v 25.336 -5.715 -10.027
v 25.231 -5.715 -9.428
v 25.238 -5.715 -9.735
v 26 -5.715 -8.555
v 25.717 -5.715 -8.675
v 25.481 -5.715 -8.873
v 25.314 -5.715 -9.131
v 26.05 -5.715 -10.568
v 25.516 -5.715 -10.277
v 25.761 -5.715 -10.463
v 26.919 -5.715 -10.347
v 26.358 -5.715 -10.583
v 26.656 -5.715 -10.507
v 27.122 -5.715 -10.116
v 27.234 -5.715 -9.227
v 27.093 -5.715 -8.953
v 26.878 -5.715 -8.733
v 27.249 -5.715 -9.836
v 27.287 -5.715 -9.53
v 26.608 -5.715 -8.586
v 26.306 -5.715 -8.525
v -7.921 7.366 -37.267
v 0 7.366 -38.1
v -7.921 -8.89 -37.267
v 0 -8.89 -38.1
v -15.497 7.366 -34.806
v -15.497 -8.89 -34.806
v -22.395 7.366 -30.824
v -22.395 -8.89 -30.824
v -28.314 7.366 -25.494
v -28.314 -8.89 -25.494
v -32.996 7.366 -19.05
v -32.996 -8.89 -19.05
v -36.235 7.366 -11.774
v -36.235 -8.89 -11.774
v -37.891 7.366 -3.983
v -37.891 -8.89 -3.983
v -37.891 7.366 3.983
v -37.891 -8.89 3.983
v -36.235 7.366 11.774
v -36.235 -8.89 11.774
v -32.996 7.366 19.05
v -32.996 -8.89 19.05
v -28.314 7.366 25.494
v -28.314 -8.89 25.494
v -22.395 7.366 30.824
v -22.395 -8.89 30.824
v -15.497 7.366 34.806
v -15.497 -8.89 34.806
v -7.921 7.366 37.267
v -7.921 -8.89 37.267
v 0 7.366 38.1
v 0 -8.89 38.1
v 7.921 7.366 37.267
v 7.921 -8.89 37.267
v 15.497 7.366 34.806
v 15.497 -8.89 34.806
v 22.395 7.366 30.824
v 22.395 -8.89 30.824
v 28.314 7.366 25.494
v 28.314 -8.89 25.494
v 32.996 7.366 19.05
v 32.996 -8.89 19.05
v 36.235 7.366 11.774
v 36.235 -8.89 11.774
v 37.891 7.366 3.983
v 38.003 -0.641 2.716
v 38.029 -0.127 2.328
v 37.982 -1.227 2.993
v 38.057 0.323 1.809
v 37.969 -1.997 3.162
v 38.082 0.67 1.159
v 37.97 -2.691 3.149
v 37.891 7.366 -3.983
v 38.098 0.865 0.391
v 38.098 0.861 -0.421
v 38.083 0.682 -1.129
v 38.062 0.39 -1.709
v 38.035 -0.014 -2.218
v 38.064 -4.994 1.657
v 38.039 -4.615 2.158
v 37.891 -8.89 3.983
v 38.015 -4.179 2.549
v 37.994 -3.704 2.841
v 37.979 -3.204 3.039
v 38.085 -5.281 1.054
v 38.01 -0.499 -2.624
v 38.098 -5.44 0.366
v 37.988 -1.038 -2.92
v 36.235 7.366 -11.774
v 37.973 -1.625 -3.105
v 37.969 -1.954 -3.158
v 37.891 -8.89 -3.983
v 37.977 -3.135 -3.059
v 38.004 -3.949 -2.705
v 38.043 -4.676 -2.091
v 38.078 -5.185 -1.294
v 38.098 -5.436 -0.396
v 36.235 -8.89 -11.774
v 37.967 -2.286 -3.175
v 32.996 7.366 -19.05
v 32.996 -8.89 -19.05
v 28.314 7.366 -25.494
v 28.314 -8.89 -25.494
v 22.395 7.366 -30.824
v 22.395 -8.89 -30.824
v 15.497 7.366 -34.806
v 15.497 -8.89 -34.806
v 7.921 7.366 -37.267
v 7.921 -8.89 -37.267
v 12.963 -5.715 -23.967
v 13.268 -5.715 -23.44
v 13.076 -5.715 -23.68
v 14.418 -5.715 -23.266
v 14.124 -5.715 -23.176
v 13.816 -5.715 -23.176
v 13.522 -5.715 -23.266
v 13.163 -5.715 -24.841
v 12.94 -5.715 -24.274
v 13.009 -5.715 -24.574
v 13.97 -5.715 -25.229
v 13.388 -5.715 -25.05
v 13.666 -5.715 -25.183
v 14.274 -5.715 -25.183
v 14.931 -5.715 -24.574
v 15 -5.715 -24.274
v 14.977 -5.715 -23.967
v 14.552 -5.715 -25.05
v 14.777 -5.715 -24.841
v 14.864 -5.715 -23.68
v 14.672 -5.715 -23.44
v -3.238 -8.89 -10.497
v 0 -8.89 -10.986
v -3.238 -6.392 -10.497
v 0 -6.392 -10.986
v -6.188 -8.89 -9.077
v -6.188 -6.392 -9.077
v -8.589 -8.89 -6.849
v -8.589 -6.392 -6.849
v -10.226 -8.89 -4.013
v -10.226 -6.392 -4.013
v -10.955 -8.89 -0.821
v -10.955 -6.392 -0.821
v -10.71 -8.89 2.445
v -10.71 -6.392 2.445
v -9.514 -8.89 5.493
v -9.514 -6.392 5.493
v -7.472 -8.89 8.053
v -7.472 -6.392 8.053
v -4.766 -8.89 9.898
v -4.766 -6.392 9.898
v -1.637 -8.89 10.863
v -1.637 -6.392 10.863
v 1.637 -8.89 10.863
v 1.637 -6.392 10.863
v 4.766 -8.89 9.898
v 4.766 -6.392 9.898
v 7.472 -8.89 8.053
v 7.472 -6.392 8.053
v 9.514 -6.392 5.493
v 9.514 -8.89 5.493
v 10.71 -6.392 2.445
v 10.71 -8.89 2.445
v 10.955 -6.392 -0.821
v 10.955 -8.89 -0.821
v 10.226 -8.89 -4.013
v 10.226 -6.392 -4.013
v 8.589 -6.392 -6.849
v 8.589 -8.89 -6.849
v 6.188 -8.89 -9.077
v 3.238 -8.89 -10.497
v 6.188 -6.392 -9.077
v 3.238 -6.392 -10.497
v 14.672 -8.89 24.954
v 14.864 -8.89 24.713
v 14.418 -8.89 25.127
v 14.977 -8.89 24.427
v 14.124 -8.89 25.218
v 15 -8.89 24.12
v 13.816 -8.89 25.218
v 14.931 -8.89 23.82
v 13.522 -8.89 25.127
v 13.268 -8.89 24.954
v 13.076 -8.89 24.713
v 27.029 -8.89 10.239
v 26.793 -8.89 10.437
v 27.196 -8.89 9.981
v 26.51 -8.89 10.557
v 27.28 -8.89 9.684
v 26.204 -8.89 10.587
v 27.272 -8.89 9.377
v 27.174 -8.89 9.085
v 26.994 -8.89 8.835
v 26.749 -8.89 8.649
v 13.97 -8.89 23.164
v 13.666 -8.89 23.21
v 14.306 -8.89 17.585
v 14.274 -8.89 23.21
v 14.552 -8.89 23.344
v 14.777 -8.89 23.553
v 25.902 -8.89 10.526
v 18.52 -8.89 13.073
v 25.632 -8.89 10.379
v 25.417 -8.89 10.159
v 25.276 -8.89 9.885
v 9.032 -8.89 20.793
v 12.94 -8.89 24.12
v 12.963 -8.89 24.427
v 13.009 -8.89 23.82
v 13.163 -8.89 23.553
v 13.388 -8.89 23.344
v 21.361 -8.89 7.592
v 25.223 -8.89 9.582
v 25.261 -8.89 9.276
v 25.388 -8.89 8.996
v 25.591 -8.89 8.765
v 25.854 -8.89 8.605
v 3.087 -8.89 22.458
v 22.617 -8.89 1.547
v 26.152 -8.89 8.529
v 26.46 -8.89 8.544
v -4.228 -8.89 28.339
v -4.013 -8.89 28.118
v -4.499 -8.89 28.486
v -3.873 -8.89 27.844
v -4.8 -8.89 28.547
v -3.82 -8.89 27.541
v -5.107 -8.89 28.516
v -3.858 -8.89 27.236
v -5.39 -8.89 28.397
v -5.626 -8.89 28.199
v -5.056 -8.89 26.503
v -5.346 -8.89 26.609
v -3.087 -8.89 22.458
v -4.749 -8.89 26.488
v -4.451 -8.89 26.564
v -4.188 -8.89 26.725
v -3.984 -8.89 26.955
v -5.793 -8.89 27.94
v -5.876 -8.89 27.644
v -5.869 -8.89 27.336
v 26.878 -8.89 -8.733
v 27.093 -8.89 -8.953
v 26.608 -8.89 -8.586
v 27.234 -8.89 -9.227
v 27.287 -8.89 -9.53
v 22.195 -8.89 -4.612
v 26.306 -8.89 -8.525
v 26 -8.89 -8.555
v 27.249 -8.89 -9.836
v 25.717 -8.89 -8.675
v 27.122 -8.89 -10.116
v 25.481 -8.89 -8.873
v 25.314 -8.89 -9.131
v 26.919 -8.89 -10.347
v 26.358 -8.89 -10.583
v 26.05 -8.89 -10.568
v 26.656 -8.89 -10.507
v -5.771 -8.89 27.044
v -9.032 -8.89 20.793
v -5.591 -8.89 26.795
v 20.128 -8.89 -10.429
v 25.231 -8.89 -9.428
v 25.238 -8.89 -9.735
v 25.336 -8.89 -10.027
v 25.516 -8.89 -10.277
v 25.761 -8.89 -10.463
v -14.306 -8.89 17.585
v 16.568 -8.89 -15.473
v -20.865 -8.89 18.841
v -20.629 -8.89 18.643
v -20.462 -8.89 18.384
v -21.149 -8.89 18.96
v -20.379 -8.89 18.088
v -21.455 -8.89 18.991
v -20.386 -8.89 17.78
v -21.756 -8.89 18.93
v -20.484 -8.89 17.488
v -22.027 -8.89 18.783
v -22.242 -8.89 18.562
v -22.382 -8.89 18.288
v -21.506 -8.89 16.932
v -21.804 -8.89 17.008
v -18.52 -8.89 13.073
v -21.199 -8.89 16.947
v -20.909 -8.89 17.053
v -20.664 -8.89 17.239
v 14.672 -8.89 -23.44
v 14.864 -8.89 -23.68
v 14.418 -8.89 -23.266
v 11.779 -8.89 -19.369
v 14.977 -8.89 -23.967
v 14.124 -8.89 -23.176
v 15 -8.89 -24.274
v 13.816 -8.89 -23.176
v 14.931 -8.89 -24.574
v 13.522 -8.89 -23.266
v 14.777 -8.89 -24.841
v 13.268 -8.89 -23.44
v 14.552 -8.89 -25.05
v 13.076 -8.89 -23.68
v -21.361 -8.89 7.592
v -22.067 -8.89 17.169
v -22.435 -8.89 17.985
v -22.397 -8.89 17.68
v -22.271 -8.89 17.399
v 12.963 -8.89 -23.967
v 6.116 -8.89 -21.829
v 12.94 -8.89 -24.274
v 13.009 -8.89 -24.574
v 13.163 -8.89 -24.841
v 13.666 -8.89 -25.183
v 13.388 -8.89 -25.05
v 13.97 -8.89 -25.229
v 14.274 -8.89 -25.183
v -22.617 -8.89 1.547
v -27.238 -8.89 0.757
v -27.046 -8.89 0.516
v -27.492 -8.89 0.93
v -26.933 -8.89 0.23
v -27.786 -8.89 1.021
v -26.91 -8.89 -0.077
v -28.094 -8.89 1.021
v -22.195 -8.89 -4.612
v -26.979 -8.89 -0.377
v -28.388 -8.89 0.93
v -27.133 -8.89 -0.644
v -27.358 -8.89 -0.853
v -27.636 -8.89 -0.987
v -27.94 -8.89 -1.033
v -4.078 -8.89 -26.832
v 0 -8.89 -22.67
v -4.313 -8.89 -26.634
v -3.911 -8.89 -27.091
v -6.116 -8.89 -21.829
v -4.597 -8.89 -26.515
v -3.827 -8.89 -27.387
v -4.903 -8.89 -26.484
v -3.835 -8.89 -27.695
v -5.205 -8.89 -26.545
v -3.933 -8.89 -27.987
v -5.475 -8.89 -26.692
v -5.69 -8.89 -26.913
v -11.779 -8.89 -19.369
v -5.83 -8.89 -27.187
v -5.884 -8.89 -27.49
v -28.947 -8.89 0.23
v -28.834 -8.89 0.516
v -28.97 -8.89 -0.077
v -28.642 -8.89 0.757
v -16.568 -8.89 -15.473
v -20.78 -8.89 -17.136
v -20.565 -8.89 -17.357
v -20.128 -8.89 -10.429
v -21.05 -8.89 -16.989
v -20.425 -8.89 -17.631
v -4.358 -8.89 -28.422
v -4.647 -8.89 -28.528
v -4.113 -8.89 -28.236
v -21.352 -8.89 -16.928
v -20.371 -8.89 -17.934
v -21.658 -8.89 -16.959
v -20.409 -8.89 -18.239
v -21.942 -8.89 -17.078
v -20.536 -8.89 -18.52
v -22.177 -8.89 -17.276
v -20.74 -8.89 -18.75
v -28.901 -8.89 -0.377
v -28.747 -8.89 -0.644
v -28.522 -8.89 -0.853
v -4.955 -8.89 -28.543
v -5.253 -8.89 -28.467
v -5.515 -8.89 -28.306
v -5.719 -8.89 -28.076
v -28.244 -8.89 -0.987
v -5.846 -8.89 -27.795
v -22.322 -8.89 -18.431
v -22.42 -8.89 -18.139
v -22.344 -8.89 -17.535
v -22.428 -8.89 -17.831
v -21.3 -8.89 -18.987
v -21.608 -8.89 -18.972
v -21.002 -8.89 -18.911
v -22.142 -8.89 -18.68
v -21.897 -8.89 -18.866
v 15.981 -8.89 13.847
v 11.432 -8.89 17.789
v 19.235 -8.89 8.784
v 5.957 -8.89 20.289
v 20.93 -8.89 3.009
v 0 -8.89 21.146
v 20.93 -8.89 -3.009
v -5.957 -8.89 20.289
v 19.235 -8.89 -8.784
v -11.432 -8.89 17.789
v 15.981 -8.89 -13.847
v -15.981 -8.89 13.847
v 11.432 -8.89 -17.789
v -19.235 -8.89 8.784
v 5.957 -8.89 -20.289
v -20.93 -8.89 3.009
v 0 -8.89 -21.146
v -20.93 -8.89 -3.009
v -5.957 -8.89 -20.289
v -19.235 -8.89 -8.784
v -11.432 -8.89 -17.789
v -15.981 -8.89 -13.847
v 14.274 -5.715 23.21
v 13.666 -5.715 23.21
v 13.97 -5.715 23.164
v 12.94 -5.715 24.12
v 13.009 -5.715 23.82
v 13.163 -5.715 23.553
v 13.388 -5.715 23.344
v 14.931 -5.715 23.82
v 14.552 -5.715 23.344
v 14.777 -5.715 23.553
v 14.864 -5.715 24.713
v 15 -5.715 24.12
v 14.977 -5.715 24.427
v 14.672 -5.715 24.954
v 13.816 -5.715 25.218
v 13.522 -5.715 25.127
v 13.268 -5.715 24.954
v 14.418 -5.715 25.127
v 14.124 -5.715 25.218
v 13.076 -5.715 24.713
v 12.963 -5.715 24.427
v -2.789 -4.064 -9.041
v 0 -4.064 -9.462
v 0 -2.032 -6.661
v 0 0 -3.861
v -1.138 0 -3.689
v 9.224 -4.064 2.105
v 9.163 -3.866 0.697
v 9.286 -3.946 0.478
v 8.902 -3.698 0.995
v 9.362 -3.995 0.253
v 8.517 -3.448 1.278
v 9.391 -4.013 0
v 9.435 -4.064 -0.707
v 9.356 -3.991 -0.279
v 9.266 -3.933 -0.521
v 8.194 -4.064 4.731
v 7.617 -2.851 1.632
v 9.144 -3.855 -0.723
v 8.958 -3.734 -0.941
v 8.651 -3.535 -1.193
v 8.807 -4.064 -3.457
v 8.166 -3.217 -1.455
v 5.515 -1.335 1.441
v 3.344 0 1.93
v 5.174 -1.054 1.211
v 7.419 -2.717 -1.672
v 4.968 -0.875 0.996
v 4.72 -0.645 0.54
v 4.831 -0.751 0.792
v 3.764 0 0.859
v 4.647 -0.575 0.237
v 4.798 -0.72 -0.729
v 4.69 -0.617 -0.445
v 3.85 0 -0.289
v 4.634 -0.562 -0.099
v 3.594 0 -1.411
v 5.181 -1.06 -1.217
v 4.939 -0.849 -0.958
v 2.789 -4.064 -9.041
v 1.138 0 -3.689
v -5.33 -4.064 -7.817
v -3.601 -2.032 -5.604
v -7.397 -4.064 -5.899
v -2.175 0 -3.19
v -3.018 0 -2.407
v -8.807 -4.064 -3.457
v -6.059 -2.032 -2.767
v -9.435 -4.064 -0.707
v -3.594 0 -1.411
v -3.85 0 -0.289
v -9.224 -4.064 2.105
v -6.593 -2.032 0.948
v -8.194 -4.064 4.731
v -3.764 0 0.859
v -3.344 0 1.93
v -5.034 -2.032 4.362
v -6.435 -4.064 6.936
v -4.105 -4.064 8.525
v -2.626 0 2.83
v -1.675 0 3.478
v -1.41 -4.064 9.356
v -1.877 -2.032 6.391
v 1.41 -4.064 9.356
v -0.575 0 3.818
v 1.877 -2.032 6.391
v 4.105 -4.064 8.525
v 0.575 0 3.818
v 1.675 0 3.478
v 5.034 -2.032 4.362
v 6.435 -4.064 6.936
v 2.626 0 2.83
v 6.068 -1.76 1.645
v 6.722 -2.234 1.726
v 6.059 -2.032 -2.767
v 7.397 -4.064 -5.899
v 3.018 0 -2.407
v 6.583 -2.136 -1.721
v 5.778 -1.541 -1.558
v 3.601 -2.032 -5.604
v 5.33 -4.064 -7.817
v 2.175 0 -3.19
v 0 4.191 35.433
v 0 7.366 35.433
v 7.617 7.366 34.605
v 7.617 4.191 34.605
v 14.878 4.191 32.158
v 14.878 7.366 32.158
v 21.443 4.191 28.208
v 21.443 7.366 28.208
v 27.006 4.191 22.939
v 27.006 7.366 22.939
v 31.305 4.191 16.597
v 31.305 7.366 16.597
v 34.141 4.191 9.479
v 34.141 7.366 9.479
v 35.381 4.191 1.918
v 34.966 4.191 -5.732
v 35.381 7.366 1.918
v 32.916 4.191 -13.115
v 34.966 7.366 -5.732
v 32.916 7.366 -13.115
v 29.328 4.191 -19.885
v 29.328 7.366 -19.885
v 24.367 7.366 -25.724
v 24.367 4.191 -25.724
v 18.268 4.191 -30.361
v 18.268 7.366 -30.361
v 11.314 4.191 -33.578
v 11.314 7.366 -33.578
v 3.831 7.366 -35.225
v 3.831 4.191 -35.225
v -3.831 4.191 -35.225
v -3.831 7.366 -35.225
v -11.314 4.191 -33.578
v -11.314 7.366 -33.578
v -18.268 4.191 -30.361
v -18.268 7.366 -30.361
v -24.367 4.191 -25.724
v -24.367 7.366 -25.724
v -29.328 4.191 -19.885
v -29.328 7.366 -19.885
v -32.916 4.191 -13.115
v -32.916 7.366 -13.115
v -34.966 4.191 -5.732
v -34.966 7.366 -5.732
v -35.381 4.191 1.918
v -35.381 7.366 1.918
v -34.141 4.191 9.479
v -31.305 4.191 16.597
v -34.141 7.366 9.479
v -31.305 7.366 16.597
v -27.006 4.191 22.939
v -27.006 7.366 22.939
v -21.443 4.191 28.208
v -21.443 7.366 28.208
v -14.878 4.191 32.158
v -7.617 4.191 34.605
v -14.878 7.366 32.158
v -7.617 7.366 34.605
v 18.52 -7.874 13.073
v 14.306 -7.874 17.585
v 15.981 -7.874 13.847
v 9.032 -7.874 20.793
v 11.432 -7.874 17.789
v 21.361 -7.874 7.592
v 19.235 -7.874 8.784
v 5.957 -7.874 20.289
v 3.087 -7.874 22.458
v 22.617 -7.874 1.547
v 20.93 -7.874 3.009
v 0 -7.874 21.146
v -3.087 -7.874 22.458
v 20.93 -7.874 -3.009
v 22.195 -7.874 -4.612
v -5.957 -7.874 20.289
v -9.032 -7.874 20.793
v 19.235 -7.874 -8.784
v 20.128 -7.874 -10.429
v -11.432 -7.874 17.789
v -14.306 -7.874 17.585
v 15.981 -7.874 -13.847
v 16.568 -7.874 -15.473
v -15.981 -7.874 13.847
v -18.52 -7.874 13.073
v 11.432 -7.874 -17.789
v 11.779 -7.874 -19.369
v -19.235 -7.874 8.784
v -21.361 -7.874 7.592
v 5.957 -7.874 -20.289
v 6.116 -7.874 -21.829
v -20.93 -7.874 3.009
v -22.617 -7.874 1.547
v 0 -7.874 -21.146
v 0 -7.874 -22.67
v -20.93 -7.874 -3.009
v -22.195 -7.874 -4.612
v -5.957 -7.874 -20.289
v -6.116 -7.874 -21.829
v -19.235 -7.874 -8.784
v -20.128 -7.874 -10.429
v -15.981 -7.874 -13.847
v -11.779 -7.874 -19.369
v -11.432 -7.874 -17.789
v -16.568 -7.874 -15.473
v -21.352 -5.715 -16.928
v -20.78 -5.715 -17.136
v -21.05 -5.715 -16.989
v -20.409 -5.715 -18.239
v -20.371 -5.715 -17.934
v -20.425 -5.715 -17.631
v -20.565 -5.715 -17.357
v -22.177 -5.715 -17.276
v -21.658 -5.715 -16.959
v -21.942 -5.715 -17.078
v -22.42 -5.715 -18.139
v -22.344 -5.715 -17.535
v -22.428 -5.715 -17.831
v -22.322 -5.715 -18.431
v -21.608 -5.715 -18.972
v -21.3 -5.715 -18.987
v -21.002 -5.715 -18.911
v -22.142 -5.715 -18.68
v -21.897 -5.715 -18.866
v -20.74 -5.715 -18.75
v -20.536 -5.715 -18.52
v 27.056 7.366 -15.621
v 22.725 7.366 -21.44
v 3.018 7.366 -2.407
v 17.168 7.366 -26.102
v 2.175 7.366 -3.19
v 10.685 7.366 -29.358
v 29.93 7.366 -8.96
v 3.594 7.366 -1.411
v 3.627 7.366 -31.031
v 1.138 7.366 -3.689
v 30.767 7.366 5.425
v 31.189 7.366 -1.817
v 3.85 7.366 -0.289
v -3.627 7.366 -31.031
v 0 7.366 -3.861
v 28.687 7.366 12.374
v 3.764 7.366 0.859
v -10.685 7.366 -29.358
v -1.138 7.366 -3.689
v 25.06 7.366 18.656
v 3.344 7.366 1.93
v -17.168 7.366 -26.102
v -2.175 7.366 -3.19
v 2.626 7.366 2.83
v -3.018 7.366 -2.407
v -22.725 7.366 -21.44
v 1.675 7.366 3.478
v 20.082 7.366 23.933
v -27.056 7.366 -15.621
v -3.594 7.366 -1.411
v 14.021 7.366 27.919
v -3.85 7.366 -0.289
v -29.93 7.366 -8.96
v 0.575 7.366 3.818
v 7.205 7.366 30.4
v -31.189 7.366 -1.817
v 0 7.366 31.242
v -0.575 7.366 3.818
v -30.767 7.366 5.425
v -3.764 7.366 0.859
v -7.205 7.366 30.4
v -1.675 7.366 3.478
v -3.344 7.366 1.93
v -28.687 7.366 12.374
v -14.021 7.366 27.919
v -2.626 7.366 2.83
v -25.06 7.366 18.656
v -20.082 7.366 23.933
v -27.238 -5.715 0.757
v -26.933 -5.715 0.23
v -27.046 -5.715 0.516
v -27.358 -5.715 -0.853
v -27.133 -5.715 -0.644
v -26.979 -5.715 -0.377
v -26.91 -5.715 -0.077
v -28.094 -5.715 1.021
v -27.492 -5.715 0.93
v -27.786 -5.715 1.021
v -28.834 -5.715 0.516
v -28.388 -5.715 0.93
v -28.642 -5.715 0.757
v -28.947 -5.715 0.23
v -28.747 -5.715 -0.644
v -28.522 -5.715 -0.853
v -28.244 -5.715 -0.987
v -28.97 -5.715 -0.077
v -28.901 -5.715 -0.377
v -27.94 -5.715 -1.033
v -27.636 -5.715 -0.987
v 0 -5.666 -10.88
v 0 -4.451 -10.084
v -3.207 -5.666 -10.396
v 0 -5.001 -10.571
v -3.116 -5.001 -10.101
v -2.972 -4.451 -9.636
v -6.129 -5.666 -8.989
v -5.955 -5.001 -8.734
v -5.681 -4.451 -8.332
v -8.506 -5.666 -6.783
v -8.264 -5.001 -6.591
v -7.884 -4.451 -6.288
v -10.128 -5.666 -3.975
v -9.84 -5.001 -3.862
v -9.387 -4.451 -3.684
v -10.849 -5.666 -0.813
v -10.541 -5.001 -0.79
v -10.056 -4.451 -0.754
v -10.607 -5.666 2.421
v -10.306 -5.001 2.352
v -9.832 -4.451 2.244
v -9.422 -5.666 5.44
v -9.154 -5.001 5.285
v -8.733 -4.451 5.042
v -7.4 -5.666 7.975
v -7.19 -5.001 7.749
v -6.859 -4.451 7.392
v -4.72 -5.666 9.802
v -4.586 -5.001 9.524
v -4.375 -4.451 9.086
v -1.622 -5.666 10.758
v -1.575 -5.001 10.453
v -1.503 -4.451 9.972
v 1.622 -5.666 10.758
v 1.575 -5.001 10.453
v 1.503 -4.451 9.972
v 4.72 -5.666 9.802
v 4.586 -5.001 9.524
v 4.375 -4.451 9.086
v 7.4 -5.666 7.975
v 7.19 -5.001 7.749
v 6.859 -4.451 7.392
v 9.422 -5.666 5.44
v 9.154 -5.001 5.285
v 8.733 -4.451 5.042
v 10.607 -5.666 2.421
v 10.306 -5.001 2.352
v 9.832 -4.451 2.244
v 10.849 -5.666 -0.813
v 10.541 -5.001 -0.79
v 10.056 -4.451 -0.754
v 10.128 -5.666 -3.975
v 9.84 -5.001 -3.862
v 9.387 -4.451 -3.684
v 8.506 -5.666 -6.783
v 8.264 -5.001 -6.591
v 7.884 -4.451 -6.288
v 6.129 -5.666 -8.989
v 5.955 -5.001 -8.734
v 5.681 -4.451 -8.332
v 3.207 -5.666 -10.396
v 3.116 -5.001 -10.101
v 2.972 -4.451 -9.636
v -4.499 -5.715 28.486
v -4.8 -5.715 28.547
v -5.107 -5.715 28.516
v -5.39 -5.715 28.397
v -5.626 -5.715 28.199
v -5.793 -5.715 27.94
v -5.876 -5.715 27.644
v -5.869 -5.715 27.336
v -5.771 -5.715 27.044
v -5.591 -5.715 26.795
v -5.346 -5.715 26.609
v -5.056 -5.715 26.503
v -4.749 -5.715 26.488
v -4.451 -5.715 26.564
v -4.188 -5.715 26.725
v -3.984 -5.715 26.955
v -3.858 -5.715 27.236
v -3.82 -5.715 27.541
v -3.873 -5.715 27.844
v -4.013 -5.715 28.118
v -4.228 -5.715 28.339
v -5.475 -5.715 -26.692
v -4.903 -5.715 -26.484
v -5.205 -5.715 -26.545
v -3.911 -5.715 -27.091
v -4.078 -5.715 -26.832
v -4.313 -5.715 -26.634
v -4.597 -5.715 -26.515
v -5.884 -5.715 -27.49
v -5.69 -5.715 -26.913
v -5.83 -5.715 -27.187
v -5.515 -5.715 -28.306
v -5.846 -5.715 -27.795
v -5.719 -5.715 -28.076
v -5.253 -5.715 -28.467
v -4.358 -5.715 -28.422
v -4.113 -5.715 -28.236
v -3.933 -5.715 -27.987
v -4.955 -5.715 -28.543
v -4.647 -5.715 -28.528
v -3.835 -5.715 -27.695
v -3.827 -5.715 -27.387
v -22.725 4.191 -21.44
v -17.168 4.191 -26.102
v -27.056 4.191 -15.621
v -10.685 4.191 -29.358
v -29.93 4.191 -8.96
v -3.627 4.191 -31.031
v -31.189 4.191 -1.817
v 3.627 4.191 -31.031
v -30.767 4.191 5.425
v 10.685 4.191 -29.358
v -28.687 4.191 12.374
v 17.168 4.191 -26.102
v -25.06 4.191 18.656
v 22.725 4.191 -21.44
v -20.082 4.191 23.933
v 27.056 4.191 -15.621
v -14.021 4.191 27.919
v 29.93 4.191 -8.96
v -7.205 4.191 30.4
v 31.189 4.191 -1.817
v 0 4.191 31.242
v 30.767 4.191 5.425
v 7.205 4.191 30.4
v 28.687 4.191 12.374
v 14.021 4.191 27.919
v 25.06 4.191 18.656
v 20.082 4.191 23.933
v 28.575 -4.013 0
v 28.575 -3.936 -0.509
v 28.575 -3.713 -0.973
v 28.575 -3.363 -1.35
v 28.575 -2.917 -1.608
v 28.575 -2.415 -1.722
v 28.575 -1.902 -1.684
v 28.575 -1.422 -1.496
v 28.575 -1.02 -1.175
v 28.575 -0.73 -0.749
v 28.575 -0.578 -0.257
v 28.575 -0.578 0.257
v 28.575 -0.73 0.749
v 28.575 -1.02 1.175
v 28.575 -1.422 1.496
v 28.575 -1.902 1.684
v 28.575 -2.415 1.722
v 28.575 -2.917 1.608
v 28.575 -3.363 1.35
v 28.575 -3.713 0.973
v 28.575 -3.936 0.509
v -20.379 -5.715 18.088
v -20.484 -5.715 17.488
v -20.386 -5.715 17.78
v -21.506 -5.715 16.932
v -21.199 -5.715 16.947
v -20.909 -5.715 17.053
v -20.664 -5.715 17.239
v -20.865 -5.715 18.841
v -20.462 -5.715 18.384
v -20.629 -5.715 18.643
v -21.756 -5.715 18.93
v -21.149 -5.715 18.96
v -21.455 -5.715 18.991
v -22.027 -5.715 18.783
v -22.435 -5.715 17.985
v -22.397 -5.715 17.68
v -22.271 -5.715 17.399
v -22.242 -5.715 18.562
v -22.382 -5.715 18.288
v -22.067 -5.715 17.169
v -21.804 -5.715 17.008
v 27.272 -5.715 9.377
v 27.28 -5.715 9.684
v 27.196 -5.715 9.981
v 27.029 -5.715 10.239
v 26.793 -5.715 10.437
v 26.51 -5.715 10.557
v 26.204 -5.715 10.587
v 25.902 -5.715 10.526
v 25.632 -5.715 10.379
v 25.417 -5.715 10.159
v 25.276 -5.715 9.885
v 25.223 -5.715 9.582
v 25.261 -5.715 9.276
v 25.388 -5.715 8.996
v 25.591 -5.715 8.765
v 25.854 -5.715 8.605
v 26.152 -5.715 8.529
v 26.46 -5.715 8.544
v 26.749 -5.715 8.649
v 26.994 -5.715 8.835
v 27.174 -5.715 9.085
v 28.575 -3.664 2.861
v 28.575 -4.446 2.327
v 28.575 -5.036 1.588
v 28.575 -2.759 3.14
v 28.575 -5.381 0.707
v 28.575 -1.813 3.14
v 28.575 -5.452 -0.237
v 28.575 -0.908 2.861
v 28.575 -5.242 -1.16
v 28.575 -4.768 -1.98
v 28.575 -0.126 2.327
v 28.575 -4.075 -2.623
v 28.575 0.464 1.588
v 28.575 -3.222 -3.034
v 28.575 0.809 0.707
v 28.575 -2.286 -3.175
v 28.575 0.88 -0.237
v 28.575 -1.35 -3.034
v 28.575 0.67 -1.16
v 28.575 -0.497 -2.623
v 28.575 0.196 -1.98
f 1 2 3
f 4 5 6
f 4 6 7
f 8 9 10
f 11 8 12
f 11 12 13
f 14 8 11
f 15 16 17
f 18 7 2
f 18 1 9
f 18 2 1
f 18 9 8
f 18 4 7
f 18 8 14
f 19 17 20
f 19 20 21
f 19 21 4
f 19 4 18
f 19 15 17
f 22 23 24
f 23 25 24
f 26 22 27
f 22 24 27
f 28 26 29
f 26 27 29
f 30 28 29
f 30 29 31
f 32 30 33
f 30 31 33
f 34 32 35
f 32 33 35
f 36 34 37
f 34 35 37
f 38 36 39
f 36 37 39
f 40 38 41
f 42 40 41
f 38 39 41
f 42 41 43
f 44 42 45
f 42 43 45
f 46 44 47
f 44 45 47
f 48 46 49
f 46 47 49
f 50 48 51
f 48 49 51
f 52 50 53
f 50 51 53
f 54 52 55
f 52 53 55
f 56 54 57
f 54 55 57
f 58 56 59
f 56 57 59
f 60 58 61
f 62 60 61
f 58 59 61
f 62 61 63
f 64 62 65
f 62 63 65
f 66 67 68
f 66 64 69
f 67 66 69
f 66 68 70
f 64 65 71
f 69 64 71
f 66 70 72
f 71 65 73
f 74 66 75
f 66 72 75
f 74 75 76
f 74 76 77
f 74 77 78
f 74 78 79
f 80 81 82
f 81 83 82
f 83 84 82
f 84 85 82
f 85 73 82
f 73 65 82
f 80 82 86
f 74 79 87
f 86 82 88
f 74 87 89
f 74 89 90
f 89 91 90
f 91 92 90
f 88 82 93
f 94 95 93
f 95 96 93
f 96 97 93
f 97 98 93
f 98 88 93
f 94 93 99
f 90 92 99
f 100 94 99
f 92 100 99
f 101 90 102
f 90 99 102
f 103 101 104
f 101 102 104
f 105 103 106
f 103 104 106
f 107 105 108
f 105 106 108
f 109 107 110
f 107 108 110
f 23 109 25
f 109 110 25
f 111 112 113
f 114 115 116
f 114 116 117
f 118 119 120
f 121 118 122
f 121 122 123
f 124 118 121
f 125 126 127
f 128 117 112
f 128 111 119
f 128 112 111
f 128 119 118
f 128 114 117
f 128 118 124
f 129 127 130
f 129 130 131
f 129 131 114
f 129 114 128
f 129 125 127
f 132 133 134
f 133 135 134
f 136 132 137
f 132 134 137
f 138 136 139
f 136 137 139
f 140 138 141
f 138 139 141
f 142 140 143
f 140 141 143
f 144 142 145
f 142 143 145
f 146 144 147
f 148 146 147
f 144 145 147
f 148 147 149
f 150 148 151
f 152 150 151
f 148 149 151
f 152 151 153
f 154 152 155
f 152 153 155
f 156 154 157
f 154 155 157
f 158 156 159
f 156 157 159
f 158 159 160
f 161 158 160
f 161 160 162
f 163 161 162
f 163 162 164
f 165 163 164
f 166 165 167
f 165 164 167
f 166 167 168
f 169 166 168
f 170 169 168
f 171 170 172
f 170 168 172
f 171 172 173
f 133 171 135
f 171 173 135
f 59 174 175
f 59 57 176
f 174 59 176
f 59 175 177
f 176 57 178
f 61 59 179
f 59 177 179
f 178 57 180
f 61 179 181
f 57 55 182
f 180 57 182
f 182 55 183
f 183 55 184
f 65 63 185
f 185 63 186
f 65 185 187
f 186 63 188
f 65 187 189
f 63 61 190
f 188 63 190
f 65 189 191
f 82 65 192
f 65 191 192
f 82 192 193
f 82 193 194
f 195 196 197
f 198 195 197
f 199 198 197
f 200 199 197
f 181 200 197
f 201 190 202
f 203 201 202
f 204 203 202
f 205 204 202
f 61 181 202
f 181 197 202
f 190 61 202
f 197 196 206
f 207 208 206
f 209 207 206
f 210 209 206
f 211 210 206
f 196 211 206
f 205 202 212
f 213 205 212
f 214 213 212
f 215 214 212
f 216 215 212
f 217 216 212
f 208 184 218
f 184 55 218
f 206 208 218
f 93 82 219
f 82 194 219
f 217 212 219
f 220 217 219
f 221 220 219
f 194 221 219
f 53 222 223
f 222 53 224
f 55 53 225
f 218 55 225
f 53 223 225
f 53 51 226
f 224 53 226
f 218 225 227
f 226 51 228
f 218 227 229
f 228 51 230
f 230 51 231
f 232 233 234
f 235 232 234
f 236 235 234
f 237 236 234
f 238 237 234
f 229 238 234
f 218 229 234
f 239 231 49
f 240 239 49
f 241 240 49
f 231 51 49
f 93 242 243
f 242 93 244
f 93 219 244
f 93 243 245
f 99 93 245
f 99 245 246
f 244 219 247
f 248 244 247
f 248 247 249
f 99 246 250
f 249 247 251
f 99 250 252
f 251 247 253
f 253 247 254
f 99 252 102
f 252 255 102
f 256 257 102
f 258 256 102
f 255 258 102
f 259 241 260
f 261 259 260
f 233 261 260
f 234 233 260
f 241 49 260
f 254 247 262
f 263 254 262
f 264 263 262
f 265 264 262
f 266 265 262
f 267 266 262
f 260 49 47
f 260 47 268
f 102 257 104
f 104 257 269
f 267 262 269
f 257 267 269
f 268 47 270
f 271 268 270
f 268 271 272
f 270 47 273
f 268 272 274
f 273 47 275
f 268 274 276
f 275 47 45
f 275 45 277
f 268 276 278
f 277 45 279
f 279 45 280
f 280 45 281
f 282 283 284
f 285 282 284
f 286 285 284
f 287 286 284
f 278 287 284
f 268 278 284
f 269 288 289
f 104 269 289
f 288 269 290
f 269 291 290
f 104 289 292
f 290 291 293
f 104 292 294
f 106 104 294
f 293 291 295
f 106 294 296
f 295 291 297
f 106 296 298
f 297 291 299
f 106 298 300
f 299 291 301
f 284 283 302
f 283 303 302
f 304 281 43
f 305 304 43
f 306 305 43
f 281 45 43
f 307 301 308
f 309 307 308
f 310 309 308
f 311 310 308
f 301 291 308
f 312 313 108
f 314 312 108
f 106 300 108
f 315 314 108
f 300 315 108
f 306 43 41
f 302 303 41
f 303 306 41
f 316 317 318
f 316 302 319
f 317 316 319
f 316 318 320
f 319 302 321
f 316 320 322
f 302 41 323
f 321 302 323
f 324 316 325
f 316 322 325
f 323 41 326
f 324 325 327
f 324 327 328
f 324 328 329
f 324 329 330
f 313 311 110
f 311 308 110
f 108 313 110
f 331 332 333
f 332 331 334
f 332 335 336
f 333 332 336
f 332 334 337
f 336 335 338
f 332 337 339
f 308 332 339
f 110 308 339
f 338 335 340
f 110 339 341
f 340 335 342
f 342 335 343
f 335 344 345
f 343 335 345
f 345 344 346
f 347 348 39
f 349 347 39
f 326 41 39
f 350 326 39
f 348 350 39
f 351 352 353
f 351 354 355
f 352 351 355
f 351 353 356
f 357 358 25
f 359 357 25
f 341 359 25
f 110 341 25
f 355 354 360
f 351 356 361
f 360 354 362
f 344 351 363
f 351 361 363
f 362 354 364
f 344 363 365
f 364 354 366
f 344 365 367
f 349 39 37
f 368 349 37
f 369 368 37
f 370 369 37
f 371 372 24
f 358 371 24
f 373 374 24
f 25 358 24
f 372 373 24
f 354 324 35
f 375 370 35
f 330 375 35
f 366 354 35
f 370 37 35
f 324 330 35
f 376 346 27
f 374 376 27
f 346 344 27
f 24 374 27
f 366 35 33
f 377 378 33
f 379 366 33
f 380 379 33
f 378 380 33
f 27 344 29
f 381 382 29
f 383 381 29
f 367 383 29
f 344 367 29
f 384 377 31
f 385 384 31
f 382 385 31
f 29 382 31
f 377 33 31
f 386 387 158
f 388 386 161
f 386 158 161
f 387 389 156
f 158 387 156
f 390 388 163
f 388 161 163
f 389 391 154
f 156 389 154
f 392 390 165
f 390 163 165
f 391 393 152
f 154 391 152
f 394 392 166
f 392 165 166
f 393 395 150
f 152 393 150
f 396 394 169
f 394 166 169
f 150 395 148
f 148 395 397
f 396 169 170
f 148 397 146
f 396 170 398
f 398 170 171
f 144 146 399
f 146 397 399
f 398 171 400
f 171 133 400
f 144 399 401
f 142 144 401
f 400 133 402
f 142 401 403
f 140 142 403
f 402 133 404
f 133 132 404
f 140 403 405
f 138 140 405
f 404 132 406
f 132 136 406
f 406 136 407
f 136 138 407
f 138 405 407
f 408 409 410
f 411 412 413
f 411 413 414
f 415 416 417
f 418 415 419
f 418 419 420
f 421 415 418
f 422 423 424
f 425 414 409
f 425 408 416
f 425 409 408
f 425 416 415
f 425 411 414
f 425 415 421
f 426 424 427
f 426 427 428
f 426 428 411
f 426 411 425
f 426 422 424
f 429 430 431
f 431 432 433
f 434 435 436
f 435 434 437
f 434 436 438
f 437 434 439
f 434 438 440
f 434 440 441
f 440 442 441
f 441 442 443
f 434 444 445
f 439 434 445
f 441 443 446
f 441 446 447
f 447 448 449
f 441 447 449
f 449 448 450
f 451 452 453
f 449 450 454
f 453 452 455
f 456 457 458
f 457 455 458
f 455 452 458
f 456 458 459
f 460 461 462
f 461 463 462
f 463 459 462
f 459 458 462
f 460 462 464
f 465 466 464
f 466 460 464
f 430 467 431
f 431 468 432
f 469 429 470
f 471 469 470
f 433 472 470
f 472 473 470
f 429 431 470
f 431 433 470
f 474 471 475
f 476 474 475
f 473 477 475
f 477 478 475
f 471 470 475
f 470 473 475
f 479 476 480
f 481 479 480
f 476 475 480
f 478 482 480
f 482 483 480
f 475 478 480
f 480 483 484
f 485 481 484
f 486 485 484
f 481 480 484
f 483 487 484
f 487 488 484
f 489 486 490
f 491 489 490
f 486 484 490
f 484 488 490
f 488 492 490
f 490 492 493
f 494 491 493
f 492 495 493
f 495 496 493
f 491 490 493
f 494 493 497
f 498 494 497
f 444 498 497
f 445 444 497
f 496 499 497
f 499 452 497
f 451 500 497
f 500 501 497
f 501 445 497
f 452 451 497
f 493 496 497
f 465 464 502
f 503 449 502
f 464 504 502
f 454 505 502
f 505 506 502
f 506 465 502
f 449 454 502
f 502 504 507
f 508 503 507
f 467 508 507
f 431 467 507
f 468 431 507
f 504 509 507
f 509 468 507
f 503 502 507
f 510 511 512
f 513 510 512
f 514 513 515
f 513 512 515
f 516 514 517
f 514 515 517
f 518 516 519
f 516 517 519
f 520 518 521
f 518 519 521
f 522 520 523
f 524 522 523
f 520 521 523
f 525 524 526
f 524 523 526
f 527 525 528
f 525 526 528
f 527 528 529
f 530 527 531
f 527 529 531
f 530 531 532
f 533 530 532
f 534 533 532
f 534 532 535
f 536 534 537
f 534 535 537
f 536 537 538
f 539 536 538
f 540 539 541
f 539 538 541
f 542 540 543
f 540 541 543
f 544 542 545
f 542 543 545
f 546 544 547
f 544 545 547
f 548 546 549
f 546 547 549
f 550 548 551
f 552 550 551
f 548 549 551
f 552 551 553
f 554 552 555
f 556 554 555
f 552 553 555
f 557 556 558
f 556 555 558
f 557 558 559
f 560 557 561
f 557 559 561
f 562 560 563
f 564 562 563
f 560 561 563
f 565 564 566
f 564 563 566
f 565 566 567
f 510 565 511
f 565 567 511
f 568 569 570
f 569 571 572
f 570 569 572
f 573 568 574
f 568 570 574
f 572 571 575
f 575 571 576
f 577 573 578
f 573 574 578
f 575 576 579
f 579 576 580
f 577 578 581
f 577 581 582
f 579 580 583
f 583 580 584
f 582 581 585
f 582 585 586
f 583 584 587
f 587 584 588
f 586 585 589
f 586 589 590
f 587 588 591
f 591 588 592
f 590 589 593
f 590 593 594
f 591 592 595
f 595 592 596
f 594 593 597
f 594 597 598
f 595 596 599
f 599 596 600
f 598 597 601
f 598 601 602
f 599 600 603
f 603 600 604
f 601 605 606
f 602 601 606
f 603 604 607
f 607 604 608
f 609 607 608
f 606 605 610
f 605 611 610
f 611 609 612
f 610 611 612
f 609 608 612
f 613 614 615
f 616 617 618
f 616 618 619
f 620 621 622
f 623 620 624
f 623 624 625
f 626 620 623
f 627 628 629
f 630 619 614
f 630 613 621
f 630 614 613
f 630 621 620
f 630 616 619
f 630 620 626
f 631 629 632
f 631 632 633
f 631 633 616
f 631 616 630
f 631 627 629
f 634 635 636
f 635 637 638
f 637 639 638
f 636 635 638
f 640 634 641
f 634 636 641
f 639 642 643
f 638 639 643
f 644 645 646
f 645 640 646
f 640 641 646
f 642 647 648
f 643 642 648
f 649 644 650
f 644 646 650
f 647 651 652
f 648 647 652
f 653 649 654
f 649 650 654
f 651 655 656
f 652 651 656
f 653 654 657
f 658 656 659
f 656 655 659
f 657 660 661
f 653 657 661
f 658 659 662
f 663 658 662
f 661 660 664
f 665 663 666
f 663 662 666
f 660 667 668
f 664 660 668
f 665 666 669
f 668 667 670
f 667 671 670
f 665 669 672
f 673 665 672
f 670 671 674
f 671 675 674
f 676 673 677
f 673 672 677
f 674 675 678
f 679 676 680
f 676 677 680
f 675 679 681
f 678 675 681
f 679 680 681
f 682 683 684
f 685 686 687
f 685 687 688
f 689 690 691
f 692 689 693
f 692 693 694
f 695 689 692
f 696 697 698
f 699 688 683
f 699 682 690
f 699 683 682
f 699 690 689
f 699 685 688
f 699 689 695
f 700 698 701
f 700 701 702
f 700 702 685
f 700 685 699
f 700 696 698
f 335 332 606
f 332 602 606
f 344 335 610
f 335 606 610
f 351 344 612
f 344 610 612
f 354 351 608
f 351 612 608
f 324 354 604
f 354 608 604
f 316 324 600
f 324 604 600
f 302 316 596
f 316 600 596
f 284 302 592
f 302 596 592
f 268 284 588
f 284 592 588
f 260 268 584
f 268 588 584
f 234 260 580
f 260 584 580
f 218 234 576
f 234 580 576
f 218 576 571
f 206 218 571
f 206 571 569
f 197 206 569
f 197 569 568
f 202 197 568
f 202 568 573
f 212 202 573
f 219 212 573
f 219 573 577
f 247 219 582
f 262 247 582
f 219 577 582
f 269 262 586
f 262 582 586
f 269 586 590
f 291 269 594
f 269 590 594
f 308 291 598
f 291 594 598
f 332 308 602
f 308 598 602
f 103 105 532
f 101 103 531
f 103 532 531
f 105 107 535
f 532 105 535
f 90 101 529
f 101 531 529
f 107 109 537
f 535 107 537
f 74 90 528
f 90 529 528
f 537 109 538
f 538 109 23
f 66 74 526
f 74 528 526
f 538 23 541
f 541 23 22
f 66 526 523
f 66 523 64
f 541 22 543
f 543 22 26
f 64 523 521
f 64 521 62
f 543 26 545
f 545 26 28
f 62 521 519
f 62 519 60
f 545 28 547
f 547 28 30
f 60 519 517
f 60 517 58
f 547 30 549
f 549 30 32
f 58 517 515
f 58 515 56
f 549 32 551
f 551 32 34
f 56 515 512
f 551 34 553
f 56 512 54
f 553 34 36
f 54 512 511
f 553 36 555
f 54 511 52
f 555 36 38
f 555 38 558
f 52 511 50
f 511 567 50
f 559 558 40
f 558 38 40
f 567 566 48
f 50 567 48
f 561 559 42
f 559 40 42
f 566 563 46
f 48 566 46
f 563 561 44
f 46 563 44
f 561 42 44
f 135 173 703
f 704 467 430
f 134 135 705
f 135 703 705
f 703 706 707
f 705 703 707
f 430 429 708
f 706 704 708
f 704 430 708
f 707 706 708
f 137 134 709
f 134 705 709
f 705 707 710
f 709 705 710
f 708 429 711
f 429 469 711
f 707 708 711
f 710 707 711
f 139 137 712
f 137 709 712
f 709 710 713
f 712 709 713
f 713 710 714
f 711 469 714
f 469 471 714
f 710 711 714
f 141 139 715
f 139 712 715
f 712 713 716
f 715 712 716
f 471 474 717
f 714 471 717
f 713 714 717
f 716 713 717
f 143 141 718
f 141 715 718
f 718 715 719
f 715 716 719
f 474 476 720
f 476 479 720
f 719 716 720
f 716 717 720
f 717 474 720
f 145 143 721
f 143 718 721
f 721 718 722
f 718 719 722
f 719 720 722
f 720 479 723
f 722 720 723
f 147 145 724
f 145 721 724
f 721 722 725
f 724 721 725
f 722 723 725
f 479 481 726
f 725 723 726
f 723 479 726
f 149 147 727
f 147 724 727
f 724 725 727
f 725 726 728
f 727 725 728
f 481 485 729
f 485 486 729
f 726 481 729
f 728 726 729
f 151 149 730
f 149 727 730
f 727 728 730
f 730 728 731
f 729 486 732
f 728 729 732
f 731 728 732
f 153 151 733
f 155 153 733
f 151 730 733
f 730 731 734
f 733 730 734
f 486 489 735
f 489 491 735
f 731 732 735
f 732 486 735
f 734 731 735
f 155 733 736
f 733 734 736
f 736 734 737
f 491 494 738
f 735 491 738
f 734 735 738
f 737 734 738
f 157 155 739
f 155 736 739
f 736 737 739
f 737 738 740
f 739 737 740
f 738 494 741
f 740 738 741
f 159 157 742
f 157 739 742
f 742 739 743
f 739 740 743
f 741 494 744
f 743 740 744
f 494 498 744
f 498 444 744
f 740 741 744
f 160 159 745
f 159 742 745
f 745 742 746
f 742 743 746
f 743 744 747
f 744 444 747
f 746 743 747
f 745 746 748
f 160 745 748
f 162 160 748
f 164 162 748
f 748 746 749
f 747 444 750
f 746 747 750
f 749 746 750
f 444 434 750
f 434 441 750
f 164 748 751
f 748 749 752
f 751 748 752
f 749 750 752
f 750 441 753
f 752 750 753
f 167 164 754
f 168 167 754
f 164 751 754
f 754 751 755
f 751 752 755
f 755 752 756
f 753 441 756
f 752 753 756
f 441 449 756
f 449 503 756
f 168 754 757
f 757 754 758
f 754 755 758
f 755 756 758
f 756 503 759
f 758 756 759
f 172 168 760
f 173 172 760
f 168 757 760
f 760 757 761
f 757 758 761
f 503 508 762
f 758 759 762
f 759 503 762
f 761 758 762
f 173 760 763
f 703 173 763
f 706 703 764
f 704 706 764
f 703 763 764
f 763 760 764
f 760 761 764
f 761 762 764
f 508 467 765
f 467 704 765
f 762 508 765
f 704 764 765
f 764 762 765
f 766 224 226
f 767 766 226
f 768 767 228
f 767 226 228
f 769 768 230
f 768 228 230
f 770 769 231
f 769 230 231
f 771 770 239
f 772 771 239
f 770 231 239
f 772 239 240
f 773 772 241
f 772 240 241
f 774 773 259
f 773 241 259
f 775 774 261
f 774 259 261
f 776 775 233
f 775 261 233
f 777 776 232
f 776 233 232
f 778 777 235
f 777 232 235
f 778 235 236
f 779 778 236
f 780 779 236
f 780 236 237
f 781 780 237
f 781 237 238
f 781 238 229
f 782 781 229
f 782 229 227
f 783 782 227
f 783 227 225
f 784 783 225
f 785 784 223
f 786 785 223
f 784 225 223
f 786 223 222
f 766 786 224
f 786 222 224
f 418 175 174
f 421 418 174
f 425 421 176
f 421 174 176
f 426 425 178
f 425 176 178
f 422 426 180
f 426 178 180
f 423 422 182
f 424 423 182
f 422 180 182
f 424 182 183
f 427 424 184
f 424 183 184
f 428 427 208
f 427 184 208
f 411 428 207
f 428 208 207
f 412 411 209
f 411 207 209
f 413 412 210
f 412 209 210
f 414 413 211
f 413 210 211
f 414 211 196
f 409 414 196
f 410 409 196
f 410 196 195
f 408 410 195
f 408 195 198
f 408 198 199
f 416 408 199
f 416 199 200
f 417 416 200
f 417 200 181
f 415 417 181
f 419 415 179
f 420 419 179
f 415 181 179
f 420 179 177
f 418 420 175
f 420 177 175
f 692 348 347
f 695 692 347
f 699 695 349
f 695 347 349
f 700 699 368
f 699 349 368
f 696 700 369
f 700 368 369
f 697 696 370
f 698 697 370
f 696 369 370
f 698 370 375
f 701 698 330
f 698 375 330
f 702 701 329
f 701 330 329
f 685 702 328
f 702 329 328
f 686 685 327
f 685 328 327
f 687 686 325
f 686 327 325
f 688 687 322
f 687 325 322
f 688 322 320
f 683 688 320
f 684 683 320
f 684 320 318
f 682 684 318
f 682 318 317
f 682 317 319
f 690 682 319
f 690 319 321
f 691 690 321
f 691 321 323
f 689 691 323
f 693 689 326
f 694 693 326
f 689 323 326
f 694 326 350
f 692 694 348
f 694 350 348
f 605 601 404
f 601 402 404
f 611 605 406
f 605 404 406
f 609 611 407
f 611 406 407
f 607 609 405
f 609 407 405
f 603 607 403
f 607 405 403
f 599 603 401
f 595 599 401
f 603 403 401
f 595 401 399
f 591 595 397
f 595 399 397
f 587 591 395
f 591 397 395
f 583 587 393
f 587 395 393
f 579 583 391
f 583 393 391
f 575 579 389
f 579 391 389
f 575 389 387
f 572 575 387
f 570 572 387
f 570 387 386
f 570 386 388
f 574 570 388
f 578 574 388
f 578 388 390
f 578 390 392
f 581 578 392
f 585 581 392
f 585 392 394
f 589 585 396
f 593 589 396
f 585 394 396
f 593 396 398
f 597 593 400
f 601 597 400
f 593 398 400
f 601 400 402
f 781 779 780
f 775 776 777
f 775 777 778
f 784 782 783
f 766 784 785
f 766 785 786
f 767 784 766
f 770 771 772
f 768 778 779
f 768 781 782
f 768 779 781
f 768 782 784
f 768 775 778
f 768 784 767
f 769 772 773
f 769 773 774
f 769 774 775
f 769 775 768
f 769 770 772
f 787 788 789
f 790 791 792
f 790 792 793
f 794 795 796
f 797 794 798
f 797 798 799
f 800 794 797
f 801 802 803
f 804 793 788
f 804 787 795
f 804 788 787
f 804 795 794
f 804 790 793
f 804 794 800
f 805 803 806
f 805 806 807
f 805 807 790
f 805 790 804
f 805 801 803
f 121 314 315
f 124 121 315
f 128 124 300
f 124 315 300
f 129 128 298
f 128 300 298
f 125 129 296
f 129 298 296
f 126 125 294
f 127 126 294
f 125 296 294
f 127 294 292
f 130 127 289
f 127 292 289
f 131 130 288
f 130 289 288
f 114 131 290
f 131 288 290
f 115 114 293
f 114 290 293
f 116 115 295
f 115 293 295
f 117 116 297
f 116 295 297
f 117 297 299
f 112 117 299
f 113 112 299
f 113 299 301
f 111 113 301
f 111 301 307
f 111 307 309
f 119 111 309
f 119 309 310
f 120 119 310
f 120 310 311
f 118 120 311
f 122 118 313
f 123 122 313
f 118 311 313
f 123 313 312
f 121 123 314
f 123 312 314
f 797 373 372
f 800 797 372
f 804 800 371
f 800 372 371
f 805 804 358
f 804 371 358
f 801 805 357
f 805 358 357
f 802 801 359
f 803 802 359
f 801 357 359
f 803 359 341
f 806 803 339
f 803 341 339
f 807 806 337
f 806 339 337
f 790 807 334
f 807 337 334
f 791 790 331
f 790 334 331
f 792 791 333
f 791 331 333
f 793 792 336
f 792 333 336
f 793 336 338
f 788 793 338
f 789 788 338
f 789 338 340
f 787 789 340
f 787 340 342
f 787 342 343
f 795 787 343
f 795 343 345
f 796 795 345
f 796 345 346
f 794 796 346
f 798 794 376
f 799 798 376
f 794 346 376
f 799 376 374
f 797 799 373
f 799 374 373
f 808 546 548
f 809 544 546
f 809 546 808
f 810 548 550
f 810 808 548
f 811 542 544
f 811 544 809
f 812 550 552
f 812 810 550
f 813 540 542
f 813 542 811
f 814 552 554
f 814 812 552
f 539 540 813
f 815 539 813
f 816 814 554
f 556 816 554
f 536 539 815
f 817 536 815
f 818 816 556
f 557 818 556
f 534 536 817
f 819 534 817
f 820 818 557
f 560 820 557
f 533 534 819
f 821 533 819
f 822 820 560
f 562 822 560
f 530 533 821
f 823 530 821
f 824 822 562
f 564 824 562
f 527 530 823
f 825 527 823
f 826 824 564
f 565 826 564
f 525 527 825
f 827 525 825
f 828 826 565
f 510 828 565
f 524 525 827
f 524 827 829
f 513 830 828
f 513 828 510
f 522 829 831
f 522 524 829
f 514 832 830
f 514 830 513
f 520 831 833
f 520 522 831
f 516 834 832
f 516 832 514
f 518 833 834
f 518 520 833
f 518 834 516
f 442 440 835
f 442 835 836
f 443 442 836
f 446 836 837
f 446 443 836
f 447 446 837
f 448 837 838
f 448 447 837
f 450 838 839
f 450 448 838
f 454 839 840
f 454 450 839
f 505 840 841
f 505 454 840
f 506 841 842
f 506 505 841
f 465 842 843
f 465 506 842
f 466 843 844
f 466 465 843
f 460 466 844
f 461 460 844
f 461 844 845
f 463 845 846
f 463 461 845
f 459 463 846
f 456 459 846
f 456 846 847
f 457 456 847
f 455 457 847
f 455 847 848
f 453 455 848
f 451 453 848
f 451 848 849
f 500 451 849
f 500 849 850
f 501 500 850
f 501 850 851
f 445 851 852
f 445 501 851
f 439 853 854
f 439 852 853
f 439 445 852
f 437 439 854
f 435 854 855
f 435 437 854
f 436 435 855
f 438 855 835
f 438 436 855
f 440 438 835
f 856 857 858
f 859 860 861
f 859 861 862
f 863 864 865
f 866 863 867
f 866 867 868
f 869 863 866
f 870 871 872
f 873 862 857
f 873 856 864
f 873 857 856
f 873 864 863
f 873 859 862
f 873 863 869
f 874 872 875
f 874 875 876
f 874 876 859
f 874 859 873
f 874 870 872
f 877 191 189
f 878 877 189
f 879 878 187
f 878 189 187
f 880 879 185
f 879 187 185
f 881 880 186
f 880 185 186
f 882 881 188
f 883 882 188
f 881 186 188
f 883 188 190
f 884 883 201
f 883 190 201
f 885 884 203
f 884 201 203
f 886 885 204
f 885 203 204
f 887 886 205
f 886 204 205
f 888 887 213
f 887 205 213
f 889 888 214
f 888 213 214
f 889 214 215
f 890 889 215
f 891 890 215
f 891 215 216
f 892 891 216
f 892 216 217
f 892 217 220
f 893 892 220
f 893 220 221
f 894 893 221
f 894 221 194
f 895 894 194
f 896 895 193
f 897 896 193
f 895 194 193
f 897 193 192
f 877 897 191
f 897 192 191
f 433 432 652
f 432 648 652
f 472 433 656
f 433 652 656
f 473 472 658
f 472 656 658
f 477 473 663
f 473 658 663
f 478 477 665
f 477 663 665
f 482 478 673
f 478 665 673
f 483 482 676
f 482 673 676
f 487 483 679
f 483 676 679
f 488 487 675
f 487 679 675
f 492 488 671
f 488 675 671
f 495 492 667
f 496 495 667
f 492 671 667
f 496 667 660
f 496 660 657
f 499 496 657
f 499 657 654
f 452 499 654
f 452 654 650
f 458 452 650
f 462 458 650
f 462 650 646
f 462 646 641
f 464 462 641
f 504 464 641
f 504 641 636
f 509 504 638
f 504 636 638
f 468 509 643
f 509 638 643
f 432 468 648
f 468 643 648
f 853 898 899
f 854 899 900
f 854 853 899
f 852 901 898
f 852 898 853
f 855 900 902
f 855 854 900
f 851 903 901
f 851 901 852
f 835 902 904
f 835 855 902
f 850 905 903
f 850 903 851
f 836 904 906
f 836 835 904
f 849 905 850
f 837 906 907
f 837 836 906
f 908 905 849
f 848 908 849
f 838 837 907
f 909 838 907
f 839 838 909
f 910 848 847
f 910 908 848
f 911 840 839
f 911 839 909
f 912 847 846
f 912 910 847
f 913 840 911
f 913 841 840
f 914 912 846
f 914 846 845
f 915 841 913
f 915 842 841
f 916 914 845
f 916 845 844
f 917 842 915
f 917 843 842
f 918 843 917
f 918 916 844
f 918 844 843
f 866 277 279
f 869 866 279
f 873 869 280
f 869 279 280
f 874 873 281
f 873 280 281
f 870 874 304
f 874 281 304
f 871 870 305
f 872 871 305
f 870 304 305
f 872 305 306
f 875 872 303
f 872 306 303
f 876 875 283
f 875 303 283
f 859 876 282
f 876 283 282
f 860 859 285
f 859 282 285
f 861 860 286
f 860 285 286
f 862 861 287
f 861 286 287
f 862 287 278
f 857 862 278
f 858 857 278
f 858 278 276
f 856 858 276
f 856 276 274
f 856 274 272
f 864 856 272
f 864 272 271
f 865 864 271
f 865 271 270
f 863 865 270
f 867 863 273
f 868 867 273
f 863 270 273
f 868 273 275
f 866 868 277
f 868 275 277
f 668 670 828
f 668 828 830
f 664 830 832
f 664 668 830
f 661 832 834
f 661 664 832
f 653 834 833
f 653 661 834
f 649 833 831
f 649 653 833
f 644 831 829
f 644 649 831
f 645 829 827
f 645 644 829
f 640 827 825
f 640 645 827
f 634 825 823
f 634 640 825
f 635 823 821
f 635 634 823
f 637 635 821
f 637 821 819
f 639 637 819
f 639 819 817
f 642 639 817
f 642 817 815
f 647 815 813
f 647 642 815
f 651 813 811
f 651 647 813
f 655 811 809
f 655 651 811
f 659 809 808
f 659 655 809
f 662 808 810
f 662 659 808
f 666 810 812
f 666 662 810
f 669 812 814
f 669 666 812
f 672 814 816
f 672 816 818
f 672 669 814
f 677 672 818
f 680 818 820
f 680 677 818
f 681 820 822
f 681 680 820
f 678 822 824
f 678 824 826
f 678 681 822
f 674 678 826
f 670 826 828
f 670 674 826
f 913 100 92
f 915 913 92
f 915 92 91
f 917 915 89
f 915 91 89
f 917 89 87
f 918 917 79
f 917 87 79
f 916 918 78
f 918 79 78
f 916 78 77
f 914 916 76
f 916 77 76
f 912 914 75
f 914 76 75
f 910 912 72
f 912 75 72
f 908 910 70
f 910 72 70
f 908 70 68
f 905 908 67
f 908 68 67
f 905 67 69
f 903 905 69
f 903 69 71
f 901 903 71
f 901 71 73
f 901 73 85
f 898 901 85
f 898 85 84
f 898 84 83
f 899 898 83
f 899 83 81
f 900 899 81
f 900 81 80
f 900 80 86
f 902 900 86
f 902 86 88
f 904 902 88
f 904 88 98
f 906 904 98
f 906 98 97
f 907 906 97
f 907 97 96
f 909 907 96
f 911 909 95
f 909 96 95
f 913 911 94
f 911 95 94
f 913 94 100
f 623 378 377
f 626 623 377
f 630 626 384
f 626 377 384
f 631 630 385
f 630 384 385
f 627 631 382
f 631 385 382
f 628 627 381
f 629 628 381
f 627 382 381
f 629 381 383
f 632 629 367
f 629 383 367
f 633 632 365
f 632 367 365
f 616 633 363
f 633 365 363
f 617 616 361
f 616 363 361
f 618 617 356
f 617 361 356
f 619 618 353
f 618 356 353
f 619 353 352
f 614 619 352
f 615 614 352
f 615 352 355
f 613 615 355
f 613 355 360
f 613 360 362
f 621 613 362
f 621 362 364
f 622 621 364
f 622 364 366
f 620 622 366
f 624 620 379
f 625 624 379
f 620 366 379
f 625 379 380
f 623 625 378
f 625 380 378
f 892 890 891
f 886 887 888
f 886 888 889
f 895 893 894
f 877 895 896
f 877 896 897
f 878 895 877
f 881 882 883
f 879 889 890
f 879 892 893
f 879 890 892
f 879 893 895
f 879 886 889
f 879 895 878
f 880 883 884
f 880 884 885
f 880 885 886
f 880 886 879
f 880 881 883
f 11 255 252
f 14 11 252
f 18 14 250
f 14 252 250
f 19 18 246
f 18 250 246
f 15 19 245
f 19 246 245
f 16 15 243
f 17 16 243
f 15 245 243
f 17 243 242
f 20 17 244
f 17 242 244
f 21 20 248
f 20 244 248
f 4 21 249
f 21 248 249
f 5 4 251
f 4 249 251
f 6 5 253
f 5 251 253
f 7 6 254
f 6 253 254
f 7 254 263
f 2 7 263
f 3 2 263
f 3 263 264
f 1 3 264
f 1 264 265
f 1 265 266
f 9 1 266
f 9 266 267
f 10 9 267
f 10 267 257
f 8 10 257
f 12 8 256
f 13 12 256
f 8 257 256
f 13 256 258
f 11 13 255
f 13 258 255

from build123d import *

# Parameters (mm, degrees)
SKETCH2_R          = 1.7272
CUT_EXTRUDE1_DEPTH = 55.61
SKETCH3_R          = 35.433
SKETCH3_R_2        = 31.242
CUT_EXTRUDE2_DEPTH = 3.175
SKETCH4_R          = 1.03251
CUT_EXTRUDE3_DEPTH = 3.175
CIRPATTERN1_COUNT  = 9
SKETCH5_R          = 3.175
CUT_EXTRUDE4_DEPTH = 9.525


with BuildPart() as part:
    # Sketch1 → Revolve1 (revolve)
    with BuildSketch(Plane.XY):
        with BuildLine():
            Line((3.8608, 7.366), (38.1, 7.366))
            Line((38.1, 7.366), (38.1, -8.89))
            Line((38.1, -8.89), (22.6695, -8.89))
            Line((22.6695, -8.89), (22.6695, -7.874))
            Line((22.6695, -7.874), (21.1455, -7.874))
            Line((21.1455, -7.874), (21.1455, -8.89))
            Line((21.1455, -8.89), (10.9855, -8.89))
            Line((10.9855, -8.89), (10.9855, -6.391948453))
            ThreePointArc((10.9855, -6.391948453), (10.570616467, -5.000733157), (9.4615, -4.064))
            Line((9.4615, -4.064), (3.8608, 0))
            Line((3.8608, 0), (3.8608, 7.366))
        make_face()
    revolve(axis=Axis((0, 101.60464546, 0), (0, 1, 0)))

    # Sketch2 → Cut-Extrude1 (cut, through all)
    with BuildSketch(Plane(origin=(0, 0, 0), x_dir=(0, 0, -1), z_dir=(1, 0, 0))):
        with Locations((0, -2.286)):
            Circle(SKETCH2_R)
    extrude(amount=CUT_EXTRUDE1_DEPTH, mode=Mode.SUBTRACT)

    # Sketch3 → Cut-Extrude2 (cut)
    with BuildSketch(Plane(origin=(0, 7.366, 0), x_dir=(1, 0, 0), z_dir=(0, 1, 0))):
        Circle(SKETCH3_R)
        Circle(SKETCH3_R_2, mode=Mode.SUBTRACT)
    extrude(amount=-CUT_EXTRUDE2_DEPTH, mode=Mode.SUBTRACT)

    # Sketch4 → Cut-Extrude3 (cut)
    with BuildSketch(Plane(origin=(0, -8.89, 0), x_dir=(-1, 0, 0), z_dir=(0, -1, 0))):
        with Locations((-13.97, 24.196749782)):
            Circle(SKETCH4_R)
    cut_extrude3 = extrude(amount=-CUT_EXTRUDE3_DEPTH, mode=Mode.SUBTRACT)

    # CirPattern1: Cut-Extrude3 ×9 about axis
    cirpattern1_axis = Axis((0, 7.366, 0), (0, -1, 0))
    for i in range(1, CIRPATTERN1_COUNT):
        add(cut_extrude3.rotate(cirpattern1_axis, i * 360 / CIRPATTERN1_COUNT), mode=Mode.SUBTRACT)

    # Sketch5 → Cut-Extrude4 (cut)
    with BuildSketch(Plane(origin=(38.1, 0, 0), x_dir=(0, 0, -1), z_dir=(1, 0, 0))):
        with Locations((0, -2.286)):
            Circle(SKETCH5_R)
    extrude(amount=-CUT_EXTRUDE4_DEPTH, mode=Mode.SUBTRACT)


solid = part.part
